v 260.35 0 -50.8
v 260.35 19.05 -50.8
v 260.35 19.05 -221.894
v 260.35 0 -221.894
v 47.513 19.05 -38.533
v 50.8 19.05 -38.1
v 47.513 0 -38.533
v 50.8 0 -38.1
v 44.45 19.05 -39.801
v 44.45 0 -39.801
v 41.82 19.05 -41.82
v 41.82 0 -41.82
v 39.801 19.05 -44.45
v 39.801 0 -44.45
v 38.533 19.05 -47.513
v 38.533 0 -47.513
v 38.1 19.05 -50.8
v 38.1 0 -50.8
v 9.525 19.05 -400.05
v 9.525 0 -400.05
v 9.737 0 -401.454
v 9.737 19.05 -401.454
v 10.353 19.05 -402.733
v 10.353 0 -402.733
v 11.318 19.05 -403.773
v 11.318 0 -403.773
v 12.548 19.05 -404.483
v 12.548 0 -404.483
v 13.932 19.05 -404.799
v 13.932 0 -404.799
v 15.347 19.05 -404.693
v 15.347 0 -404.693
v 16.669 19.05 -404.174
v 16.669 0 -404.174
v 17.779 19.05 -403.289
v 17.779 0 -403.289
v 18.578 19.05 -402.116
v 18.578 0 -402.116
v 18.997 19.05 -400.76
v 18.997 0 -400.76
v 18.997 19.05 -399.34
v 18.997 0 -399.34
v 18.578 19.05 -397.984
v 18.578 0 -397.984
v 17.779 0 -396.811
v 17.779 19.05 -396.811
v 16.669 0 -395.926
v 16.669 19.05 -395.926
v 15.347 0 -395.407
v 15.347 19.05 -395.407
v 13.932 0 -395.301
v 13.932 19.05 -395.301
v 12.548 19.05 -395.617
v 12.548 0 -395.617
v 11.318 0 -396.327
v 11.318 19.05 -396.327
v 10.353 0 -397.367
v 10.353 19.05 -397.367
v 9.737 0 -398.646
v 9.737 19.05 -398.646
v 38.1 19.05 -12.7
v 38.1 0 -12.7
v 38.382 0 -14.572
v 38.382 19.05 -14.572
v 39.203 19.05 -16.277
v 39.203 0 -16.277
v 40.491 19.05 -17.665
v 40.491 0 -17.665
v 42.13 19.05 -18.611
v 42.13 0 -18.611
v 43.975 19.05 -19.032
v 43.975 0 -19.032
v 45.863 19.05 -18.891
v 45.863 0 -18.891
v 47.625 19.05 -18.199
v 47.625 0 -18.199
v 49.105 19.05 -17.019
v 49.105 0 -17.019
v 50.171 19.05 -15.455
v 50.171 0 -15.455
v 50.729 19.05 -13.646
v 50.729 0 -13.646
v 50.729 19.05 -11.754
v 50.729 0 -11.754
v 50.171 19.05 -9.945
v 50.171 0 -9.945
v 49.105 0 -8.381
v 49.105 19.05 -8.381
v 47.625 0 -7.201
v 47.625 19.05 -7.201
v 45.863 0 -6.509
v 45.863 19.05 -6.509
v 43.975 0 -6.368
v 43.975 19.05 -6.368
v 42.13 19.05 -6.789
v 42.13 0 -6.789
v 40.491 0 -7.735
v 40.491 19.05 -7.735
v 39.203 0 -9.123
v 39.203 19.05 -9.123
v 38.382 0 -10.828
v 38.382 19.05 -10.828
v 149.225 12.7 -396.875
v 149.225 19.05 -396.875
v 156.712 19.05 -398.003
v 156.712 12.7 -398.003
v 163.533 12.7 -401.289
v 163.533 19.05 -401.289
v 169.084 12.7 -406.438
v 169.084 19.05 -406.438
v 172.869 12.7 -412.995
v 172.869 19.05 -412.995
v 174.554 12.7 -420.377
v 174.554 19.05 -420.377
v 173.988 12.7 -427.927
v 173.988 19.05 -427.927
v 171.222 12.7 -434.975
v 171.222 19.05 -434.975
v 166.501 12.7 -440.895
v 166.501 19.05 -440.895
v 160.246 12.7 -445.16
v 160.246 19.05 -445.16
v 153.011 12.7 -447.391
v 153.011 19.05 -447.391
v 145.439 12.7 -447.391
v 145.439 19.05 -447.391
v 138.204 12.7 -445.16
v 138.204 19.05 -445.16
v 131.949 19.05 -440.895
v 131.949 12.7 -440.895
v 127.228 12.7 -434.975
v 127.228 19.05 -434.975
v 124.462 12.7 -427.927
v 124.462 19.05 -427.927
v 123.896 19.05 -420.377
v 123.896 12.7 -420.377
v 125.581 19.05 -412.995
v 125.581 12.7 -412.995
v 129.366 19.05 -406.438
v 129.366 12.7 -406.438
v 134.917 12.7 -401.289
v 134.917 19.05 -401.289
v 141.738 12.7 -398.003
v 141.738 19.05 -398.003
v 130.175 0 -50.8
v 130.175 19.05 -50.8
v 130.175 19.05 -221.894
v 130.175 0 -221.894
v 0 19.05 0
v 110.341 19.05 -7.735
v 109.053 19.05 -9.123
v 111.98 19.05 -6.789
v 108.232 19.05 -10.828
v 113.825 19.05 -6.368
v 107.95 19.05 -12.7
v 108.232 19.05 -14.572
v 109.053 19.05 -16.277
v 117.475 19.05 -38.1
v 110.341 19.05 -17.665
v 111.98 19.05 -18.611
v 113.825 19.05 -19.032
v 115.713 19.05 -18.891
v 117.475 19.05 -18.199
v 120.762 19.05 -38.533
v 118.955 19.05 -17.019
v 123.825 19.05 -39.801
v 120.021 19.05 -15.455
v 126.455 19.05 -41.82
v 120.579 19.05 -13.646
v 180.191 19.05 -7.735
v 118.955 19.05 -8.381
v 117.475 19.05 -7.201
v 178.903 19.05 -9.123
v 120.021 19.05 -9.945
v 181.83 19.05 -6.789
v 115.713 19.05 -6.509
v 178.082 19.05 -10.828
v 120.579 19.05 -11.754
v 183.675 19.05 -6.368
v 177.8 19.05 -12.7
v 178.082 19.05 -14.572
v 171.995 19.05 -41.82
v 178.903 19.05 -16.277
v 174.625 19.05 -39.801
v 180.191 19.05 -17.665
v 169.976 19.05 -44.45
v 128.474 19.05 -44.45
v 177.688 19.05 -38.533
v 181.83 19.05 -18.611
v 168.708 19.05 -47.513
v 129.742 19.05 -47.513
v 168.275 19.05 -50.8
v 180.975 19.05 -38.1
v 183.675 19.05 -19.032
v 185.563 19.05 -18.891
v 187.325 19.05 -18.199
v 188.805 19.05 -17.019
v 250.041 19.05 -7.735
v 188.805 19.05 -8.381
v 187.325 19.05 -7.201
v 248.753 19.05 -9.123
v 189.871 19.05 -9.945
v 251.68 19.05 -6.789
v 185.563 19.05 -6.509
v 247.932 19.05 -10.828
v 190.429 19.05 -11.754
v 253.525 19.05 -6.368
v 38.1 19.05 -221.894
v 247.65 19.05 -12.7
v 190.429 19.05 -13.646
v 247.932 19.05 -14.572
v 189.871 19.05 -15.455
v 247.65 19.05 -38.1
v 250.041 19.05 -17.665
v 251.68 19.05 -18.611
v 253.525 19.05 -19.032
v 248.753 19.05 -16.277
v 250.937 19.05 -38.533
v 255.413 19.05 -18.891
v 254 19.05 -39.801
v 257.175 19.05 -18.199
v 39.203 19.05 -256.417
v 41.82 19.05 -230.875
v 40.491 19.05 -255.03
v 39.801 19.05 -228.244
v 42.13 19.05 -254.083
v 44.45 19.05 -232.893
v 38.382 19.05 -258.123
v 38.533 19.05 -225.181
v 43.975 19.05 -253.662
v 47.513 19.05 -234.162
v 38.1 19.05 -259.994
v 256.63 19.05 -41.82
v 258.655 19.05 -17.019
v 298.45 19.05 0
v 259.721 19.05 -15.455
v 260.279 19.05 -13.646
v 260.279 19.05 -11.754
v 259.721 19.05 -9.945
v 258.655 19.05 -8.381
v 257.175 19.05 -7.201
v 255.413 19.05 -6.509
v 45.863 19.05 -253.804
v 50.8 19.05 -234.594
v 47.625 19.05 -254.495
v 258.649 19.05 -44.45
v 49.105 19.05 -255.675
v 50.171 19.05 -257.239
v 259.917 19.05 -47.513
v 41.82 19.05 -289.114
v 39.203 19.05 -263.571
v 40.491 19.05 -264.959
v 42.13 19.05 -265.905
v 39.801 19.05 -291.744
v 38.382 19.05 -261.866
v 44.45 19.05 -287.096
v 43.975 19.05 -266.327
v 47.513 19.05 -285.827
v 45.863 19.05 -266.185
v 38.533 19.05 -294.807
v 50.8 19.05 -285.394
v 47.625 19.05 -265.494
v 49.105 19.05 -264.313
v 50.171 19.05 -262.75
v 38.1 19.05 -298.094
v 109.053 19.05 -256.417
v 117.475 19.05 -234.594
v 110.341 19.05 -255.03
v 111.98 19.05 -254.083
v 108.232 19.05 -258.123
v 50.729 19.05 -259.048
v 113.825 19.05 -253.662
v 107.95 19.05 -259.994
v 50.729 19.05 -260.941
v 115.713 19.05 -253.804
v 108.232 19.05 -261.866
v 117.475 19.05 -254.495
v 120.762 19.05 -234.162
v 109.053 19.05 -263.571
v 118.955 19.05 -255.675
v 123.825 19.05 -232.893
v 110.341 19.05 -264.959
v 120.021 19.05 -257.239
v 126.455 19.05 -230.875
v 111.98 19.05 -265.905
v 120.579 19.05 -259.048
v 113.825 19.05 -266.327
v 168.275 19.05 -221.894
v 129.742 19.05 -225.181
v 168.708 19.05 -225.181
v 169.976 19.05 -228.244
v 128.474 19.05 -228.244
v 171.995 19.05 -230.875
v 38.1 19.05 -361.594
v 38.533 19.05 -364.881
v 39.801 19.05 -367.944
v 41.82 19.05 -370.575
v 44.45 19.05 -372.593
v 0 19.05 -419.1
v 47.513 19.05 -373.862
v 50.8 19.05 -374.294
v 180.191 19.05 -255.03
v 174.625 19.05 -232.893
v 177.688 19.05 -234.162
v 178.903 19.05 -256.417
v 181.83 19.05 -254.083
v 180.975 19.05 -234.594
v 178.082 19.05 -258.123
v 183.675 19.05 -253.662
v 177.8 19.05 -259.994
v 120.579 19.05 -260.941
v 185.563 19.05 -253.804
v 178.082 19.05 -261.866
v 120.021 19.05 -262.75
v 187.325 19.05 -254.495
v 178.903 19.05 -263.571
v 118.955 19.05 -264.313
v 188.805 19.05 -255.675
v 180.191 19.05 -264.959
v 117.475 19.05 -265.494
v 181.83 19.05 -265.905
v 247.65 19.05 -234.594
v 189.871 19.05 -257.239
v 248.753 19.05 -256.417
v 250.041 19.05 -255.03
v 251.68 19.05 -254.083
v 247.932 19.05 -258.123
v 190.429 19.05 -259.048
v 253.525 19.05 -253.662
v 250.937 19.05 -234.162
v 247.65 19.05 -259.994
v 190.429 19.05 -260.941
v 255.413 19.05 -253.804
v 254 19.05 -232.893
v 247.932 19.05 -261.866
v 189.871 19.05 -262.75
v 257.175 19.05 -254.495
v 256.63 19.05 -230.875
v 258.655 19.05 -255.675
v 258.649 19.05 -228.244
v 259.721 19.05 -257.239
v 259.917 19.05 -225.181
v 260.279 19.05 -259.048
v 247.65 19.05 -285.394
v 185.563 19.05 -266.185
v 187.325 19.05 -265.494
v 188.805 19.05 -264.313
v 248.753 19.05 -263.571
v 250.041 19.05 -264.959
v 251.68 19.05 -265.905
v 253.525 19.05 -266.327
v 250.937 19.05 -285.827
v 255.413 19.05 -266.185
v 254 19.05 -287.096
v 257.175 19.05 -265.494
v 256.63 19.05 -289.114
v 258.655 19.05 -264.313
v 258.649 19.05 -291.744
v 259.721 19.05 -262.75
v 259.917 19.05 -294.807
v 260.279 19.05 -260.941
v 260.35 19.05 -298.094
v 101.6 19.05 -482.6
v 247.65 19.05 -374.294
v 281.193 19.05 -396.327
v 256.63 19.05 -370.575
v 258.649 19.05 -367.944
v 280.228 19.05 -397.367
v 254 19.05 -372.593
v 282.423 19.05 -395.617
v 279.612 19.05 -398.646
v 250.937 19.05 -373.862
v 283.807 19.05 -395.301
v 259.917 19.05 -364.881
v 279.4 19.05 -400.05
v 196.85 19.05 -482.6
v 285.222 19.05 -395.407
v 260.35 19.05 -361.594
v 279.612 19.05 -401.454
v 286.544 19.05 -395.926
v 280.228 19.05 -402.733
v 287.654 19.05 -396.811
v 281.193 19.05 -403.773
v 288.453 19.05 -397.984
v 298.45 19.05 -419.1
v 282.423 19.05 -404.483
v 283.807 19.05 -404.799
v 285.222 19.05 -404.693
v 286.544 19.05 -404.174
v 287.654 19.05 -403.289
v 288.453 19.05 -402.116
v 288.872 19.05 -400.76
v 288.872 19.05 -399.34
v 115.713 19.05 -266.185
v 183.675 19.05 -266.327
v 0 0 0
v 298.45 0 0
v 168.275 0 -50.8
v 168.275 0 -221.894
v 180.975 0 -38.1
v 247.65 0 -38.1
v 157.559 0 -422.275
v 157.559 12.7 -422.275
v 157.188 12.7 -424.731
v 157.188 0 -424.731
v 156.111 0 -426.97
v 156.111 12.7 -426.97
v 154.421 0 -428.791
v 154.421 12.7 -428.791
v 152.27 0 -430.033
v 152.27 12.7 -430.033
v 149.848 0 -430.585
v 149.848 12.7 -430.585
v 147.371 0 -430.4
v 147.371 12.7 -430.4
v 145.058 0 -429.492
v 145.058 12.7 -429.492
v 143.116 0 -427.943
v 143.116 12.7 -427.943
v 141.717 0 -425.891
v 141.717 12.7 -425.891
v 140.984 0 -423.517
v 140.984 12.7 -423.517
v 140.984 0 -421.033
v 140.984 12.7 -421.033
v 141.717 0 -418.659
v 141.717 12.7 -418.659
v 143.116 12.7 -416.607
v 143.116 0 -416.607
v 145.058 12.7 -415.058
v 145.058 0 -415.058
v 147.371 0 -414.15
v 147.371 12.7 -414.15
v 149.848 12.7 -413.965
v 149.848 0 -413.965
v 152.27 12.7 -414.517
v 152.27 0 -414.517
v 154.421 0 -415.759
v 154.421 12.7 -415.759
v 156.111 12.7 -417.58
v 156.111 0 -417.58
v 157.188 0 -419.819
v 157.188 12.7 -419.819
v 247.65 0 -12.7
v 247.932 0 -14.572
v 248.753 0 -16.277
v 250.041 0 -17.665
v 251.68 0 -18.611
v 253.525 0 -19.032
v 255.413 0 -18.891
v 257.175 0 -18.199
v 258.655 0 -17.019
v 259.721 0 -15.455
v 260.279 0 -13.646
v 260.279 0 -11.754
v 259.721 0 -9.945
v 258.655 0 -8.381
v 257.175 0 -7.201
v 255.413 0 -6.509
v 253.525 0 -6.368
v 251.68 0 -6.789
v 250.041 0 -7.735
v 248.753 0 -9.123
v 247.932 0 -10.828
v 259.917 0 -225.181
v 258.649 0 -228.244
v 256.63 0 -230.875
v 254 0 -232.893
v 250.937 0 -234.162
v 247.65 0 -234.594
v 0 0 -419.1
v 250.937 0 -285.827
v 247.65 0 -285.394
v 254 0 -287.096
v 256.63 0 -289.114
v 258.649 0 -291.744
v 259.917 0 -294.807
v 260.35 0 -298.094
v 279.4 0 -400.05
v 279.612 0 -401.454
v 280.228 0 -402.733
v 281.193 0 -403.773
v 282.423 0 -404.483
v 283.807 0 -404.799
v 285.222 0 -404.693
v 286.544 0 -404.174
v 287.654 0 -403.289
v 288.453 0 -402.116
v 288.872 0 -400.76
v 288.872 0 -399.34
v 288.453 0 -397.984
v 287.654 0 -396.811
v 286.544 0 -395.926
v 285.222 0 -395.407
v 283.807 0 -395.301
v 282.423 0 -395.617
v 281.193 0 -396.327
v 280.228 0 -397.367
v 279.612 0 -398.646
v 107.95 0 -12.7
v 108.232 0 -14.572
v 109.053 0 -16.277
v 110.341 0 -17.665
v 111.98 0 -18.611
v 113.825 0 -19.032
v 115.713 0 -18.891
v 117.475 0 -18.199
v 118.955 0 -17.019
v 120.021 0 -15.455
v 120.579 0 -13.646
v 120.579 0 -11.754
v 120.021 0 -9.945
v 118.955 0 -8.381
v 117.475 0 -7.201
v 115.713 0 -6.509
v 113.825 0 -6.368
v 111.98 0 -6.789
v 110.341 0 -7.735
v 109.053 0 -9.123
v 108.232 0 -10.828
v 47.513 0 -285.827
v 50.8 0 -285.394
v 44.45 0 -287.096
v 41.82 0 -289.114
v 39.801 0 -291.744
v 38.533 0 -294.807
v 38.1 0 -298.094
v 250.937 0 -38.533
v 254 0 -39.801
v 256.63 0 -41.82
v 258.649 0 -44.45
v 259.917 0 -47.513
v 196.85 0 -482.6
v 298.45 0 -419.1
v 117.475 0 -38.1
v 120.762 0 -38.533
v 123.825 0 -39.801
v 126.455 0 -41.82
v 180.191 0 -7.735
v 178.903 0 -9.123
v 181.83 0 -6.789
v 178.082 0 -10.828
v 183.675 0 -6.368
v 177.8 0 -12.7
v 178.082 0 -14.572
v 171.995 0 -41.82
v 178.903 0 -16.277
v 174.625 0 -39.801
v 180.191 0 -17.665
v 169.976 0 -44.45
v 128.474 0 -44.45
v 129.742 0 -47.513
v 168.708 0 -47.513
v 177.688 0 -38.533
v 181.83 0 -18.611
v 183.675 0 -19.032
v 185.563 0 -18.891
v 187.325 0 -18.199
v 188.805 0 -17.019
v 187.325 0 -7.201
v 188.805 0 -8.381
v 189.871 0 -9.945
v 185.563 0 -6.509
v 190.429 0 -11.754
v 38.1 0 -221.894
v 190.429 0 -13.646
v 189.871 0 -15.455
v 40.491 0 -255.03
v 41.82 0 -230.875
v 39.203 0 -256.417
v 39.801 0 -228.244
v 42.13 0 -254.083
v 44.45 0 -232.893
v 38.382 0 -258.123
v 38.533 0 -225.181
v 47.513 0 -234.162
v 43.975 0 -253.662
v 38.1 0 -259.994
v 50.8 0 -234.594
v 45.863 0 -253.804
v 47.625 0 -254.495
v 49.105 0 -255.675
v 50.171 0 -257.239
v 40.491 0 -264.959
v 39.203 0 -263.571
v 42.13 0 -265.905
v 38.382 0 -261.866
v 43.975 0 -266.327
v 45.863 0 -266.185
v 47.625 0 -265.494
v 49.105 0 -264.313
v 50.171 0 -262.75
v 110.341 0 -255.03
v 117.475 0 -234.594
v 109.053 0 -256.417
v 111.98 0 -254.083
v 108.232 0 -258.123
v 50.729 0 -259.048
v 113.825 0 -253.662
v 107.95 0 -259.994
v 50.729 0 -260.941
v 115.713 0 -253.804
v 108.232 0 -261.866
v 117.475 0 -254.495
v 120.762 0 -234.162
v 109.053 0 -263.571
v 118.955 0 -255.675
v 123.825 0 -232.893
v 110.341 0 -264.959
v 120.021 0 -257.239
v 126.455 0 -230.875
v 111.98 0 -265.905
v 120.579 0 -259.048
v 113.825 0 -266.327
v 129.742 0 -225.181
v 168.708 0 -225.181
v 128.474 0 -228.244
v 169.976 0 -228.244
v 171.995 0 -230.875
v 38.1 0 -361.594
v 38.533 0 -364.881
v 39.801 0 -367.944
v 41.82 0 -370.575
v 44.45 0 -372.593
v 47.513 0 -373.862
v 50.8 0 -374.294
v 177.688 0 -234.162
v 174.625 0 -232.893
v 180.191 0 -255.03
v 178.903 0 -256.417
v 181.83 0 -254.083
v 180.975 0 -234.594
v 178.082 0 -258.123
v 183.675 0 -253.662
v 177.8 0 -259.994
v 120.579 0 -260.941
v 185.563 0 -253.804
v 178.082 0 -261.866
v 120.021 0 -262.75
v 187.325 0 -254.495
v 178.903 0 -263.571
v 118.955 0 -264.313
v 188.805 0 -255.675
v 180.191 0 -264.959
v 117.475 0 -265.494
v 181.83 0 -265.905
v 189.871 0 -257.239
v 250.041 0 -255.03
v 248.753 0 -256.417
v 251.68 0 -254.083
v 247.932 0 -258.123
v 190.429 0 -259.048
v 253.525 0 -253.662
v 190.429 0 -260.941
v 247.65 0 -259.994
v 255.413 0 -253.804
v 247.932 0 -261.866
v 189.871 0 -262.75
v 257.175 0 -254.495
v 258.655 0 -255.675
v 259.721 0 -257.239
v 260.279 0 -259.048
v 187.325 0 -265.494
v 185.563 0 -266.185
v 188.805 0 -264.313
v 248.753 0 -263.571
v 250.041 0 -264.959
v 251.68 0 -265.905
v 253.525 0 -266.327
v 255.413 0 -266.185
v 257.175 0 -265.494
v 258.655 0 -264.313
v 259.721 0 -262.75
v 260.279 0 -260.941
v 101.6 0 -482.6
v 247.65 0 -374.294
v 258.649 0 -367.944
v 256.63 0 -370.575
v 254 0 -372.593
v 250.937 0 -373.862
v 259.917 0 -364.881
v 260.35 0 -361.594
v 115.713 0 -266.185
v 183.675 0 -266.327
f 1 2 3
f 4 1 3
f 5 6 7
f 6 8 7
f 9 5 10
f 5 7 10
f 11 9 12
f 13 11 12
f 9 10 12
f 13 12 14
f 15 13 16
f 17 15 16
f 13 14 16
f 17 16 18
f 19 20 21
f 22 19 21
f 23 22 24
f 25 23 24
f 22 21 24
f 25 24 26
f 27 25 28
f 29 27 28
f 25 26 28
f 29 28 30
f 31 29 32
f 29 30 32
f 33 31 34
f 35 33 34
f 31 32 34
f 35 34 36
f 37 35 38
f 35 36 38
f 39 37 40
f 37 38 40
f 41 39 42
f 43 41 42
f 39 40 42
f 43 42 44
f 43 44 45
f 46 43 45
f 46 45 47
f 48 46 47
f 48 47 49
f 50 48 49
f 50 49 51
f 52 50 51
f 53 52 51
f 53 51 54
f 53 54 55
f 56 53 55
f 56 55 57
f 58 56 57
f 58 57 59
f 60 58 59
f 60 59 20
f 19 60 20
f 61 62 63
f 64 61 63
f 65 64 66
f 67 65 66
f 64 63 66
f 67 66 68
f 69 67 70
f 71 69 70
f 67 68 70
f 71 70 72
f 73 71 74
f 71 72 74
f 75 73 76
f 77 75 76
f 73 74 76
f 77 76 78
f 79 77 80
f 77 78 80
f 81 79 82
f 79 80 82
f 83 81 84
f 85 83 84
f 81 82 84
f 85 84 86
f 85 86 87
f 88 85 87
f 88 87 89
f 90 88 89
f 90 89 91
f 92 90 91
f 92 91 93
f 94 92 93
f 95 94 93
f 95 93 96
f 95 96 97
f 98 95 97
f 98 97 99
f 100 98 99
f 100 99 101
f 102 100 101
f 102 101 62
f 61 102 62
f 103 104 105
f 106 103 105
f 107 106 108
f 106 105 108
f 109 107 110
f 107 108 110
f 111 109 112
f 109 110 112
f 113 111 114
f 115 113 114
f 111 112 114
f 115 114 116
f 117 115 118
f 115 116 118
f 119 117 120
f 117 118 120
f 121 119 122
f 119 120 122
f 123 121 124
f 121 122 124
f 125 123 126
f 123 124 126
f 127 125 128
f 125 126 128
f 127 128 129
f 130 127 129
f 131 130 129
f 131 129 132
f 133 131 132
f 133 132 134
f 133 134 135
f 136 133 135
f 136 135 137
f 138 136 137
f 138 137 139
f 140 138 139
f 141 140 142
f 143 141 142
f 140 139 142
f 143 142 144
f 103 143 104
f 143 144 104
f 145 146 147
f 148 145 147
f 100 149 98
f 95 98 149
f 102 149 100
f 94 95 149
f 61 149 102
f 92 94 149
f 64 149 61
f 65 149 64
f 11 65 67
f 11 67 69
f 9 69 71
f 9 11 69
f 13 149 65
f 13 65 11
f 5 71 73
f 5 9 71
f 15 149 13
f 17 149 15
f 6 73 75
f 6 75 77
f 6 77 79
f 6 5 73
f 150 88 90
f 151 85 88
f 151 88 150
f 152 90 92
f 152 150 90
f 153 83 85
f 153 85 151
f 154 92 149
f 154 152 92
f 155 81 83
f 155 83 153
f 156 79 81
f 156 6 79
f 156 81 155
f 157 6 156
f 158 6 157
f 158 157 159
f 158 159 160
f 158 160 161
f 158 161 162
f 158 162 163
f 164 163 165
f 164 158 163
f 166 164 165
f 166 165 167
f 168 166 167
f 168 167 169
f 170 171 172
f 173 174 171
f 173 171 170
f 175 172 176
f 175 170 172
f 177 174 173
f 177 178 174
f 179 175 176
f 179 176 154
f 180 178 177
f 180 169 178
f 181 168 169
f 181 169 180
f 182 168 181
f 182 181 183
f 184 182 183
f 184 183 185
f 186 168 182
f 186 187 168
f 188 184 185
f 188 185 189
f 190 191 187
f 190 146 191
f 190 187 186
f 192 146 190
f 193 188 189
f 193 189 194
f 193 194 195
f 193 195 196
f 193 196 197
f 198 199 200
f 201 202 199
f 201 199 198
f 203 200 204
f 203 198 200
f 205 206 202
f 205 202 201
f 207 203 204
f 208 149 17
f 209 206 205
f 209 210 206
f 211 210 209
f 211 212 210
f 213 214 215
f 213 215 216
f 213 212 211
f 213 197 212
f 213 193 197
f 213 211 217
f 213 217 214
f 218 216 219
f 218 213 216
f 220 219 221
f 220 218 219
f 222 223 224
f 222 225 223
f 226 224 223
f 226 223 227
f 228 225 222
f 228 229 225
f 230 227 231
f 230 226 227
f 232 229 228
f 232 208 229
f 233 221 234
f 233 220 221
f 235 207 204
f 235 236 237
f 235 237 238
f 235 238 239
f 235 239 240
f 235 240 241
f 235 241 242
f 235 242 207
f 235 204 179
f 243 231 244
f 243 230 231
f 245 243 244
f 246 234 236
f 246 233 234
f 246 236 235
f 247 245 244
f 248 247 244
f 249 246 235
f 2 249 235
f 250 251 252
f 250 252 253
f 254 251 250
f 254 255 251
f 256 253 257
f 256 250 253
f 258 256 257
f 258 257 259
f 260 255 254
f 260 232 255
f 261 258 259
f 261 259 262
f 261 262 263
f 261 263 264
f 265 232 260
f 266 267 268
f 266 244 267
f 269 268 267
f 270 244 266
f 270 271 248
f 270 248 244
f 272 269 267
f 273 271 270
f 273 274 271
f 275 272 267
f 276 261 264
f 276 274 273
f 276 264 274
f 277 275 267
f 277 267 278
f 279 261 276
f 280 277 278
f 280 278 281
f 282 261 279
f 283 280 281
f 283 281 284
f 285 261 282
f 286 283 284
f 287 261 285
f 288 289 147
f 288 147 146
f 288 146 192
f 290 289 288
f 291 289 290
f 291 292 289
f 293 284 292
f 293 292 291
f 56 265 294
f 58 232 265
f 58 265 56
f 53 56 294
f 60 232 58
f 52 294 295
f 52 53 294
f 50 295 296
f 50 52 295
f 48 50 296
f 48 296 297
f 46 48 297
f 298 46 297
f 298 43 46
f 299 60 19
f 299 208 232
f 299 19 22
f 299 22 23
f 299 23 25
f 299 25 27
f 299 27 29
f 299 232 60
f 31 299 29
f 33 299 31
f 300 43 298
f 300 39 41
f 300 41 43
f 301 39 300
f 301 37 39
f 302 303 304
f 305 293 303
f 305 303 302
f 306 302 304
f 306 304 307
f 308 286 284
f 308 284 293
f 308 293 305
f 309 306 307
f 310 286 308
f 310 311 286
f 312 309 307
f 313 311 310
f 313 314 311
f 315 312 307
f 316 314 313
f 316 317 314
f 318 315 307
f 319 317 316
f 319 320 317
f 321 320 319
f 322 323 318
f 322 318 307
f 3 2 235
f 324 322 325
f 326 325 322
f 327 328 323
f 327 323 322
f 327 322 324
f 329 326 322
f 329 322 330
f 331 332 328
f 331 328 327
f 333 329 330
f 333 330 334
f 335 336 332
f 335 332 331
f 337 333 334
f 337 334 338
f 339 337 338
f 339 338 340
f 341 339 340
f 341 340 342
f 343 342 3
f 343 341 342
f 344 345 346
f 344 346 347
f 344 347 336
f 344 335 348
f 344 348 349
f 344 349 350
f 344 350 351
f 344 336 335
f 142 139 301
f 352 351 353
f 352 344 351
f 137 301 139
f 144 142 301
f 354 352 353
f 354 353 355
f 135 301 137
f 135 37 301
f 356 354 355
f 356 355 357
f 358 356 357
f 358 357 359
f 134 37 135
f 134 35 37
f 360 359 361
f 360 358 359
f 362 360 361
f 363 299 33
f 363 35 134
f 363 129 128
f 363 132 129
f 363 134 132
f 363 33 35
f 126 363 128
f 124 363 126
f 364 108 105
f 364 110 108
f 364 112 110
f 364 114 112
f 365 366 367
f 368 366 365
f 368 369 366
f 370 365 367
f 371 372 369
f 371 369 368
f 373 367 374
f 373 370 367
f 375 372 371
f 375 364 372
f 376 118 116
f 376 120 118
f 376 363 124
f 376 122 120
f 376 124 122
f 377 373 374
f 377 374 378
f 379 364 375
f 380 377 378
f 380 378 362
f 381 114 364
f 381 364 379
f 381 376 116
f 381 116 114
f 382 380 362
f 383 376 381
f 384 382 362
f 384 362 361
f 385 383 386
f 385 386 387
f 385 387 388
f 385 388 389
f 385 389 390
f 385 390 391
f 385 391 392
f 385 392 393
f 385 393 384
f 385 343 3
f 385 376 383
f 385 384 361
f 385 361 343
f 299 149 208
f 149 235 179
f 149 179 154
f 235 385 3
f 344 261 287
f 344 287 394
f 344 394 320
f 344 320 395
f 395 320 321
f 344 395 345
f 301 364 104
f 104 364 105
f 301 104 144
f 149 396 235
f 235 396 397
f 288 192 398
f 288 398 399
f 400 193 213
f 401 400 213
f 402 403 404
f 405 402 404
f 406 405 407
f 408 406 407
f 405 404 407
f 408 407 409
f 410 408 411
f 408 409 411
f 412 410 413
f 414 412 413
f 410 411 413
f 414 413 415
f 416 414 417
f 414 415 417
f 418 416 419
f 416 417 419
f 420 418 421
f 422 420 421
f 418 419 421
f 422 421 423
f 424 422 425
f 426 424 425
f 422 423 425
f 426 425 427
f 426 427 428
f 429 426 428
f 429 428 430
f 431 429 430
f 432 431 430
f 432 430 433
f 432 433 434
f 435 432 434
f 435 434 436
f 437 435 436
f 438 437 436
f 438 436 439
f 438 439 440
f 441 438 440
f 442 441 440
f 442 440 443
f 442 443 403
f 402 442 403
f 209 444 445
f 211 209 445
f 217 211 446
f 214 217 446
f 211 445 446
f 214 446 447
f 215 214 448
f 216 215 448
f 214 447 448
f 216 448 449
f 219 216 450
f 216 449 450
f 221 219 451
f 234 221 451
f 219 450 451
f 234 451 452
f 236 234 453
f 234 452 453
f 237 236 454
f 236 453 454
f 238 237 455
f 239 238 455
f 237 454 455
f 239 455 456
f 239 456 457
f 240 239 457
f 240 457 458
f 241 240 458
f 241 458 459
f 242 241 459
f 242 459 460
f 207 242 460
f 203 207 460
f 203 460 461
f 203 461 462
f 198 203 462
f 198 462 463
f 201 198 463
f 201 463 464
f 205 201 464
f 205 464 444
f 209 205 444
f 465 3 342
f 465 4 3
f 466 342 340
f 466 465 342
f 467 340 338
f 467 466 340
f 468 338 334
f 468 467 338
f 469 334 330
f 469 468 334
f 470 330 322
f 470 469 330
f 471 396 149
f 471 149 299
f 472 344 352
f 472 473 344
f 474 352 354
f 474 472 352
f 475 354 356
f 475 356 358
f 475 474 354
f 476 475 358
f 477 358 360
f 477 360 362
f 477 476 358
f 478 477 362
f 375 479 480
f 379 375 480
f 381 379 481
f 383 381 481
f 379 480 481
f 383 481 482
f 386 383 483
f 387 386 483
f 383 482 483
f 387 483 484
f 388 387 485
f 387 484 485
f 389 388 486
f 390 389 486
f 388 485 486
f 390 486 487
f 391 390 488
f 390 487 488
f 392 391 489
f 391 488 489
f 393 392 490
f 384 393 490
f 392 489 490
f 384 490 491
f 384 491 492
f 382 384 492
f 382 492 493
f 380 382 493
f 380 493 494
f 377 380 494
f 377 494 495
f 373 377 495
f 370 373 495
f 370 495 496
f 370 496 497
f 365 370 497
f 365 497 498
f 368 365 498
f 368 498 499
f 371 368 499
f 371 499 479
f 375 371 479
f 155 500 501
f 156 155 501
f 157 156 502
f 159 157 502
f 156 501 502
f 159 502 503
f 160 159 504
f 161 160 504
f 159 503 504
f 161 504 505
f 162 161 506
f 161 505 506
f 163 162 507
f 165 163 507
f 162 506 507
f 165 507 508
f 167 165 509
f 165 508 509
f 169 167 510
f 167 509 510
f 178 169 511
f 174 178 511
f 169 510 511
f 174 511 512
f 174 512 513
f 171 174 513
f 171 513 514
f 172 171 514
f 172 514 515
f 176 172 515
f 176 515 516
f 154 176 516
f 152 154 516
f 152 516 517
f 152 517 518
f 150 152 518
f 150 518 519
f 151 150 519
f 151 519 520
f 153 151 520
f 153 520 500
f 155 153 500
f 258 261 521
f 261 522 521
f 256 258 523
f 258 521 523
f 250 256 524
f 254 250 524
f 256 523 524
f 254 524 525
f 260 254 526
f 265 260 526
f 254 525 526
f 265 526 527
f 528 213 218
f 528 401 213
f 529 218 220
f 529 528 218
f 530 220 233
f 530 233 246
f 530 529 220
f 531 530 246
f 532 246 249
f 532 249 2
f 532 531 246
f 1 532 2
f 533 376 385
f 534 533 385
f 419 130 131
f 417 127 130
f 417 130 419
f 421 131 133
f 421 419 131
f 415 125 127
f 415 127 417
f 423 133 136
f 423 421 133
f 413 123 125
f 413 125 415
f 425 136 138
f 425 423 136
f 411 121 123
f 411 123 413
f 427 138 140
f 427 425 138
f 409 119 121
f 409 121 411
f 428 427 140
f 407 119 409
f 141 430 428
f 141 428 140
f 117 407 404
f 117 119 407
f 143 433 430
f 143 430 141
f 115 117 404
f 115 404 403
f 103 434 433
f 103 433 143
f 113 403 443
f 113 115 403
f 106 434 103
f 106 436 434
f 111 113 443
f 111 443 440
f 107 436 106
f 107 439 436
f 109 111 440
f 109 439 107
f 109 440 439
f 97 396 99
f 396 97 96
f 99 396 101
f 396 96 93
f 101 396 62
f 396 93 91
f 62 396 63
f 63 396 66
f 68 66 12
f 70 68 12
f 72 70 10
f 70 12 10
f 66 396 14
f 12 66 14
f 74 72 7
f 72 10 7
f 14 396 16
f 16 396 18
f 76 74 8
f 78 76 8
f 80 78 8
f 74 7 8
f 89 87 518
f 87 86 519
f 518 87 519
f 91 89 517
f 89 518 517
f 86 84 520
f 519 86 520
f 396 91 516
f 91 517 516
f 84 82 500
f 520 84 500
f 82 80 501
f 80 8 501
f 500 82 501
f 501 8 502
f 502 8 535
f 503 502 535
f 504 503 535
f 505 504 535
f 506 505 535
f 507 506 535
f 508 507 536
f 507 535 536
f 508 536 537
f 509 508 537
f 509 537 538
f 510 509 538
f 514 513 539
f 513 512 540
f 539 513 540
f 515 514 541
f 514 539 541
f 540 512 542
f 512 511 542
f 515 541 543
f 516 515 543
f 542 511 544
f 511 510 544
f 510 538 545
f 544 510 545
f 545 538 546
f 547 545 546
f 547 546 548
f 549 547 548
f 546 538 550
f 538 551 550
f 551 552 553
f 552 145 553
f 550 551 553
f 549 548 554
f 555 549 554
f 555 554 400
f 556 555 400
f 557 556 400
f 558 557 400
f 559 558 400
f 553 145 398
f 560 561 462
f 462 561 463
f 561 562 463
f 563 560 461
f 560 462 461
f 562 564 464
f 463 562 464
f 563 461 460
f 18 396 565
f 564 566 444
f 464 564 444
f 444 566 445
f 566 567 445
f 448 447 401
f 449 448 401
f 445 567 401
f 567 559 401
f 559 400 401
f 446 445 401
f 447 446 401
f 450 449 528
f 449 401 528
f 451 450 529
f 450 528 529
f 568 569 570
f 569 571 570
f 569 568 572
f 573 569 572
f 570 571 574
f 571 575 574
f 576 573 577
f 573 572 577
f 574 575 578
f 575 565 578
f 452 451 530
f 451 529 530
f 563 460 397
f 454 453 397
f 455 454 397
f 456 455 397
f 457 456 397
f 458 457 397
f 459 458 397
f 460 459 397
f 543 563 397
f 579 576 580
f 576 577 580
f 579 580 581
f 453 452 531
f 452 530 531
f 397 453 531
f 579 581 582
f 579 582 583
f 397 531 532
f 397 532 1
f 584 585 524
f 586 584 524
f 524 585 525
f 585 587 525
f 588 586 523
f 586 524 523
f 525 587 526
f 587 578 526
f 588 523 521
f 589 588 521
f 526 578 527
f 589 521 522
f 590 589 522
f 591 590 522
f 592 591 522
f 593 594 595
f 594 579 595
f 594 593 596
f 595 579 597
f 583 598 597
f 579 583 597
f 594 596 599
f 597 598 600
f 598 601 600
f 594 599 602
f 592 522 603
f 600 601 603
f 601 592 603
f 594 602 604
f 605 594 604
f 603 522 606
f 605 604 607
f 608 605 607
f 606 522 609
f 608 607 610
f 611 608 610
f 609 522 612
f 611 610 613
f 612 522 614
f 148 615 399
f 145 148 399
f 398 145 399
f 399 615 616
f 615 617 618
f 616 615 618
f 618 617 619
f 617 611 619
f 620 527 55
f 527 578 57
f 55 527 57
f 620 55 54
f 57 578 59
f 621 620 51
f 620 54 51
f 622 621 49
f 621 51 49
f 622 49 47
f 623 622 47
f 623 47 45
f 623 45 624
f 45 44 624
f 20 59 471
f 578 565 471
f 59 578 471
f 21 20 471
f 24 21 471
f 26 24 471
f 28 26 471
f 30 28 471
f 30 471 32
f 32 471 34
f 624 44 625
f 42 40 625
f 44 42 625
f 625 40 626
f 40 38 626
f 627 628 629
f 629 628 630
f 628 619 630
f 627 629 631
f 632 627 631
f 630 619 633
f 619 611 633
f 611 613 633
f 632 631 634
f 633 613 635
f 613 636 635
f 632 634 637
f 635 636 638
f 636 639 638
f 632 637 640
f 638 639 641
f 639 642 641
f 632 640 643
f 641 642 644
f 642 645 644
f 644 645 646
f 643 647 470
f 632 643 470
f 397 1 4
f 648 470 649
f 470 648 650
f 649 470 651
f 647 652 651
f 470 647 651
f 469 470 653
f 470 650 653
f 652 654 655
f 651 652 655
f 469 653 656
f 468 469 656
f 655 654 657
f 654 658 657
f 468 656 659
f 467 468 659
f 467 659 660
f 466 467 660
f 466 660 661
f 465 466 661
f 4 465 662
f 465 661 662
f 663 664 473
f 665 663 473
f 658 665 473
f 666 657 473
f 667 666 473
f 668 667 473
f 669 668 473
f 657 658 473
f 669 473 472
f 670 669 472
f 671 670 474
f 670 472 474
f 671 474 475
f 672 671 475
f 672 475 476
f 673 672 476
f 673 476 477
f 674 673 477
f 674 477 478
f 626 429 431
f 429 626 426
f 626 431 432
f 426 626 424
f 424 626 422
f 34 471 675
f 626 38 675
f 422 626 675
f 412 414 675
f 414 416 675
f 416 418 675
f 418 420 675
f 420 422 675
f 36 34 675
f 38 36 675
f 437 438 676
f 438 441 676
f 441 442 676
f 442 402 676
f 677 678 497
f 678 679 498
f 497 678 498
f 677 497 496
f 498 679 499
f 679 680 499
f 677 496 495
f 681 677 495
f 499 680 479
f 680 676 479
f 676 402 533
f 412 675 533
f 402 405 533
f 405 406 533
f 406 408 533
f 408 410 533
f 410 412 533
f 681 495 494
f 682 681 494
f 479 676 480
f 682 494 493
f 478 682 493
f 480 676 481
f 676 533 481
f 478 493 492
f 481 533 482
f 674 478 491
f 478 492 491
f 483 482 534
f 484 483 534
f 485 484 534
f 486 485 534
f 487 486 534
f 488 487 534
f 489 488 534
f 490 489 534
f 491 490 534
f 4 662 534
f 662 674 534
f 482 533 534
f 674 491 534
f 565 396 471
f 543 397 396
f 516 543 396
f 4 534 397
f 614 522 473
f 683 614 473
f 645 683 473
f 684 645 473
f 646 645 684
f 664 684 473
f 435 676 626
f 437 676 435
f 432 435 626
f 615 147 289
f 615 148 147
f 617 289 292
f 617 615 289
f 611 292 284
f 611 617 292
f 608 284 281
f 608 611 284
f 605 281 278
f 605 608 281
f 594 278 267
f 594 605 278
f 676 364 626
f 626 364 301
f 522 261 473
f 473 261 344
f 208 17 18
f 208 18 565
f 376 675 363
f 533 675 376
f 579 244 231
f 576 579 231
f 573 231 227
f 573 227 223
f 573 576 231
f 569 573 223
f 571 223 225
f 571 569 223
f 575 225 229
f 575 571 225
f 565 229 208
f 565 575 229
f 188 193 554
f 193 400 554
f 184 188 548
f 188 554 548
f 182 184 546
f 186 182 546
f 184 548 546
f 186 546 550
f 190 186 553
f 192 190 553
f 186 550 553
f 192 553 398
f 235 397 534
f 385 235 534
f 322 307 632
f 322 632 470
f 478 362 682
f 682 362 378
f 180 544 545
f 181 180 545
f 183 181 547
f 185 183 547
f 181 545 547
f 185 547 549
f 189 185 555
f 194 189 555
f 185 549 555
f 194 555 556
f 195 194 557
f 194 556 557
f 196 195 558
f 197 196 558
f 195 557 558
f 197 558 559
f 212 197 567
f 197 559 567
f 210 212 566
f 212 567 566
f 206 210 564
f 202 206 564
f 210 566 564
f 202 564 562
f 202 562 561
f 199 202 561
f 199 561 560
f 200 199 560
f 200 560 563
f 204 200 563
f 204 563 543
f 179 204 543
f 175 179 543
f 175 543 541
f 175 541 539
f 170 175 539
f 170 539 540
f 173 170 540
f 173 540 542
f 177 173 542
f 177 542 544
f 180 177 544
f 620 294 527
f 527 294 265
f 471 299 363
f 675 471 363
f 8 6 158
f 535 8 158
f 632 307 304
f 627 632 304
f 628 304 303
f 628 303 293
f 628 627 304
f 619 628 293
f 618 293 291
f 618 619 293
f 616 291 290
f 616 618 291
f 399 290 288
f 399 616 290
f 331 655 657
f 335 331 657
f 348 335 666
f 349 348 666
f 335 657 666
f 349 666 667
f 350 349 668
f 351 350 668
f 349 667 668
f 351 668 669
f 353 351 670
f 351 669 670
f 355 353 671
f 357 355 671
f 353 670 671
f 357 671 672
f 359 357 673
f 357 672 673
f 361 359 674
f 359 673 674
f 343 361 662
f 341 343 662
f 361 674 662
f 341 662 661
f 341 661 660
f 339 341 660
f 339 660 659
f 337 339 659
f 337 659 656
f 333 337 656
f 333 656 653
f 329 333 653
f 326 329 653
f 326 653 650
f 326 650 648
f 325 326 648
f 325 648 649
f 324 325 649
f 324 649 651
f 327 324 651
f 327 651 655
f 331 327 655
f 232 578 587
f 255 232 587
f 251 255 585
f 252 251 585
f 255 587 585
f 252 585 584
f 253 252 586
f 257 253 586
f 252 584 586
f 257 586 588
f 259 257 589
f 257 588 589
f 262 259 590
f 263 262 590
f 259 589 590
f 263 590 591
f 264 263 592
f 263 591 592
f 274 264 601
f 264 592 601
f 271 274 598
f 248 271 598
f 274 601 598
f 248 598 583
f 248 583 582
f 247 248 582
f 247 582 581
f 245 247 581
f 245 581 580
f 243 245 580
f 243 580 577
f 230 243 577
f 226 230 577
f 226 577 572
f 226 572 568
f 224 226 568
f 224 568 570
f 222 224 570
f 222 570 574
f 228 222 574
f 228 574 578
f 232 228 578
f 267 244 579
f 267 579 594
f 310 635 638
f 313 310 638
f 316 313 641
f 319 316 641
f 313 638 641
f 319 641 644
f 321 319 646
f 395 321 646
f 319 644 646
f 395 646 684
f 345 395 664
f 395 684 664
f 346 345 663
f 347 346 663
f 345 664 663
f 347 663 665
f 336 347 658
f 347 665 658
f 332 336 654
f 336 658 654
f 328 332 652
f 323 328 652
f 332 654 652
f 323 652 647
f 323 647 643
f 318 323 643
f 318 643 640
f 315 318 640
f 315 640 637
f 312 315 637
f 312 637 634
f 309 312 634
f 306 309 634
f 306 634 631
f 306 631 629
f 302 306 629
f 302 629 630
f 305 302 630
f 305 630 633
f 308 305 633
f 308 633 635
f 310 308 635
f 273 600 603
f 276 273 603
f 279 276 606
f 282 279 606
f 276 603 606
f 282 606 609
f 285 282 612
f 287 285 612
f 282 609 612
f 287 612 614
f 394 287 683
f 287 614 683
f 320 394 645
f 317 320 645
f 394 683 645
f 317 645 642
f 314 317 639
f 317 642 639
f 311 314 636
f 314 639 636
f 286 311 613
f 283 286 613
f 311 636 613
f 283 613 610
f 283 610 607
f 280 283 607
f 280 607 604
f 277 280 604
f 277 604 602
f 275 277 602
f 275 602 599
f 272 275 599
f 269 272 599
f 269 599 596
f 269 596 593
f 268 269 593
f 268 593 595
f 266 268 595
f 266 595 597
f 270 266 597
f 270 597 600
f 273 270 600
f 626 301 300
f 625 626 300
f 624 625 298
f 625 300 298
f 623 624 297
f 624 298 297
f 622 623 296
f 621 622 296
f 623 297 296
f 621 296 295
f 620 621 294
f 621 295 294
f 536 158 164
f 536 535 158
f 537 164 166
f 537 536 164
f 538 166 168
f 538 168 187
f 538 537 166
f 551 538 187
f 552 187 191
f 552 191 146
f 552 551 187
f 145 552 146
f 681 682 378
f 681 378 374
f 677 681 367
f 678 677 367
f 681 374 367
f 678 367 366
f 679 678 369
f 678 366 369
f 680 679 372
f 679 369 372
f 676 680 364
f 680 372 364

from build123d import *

# Parameters (mm, degrees)
SKETCH1_W                    = 298.45
SKETCH1_H                    = 482.6
BOSS_EXTRUDE1_DEPTH          = 19.05
F_1_2_0_5_DIAMETER_HOLE1_D   = 12.7
LPATTERN1_COUNT              = 4
LPATTERN1_PITCH              = 69.85
LPATTERN1_COUNT_DIR2         = 2
LPATTERN1_PITCH_DIR2         = 247.2944
F_3_8_0_375_DIAMETER_HOLE1_D = 9.525
SKETCH6_R                    = 25.4
CUT_EXTRUDE1_DEPTH           = 6.35
F_3_4_10_TAPPED_HOLE1_D      = 16.66748
SKETCH10_W                   = 92.075
SKETCH10_H                   = 196.4944
SKETCH10_H_2                 = 76.5556
CUT_EXTRUDE2_DEPTH           = 568.74824086
FILLET1_R                    = 12.7
CUT_EXTRUDE3_DEPTH           = 568.74824086
CUT_EXTRUDE4_DEPTH           = 568.74824086


with BuildPart() as part:
    # Sketch1 → Boss-Extrude1 (new body)
    with BuildSketch(Plane(origin=(0, 0, 0), x_dir=(1, 0, 0), z_dir=(0, 1, 0))):
        with Locations((149.225, 241.3)):
            Rectangle(SKETCH1_W, SKETCH1_H)
    extrude(amount=BOSS_EXTRUDE1_DEPTH)

    # 1/2 (0.5) Diameter Hole1 (through all)
    with Locations(Plane(origin=(0, 19.05, 0), x_dir=(1, 0, 0), z_dir=(0, 1, 0))):
        with Locations((44.45, 12.7)):
            f_1_2_0_5_diameter_hole1 = Hole(F_1_2_0_5_DIAMETER_HOLE1_D / 2)

    # LPattern1: 1_2 _0.5_ Diameter Hole1 4 × 2
    with Locations(*[(i * LPATTERN1_PITCH, 0, -j * LPATTERN1_PITCH_DIR2) for i in range(LPATTERN1_COUNT) for j in range(LPATTERN1_COUNT_DIR2) if (i, j) != (0, 0)]):
        add(f_1_2_0_5_diameter_hole1, mode=Mode.SUBTRACT)

    # 3/8 (0.375) Diameter Hole1 (through all)
    with Locations(Plane(origin=(0, 19.05, 0), x_dir=(1, 0, 0), z_dir=(0, 1, 0))):
        with Locations((284.1625, 400.05), (14.2875, 400.05)):
            Hole(F_3_8_0_375_DIAMETER_HOLE1_D / 2)

    # Sketch6 → Cut-Extrude1 (cut)
    with BuildSketch(Plane(origin=(0, 19.05, 0), x_dir=(1, 0, 0), z_dir=(0, 1, 0))):
        with Locations(Location((149.225, 422.275, 0), (0, 0, 270))):
            Circle(SKETCH6_R)
    extrude(amount=-CUT_EXTRUDE1_DEPTH, mode=Mode.SUBTRACT)

    # 3/4-10 Tapped Hole1 (through all)
    with Locations(Plane(origin=(0, 0, 0), x_dir=(-1, 0, 0), z_dir=(0, -1, 0))):
        with Locations((-149.225, 422.275)):
            Hole(F_3_4_10_TAPPED_HOLE1_D / 2)

    # Sketch10 → Cut-Extrude2 (cut, through all)
    with BuildSketch(Plane(origin=(0, 19.05, 0), x_dir=(1, 0, 0), z_dir=(0, 1, 0))):
        with Locations((84.1375, 136.3472)):
            Rectangle(SKETCH10_W, SKETCH10_H)
        with Locations((214.3125, 136.3472)):
            Rectangle(SKETCH10_W, SKETCH10_H)
        with Locations((84.1375, 323.6722)):
            Rectangle(SKETCH10_W, SKETCH10_H_2)
        with Locations((214.3125, 323.6722)):
            Rectangle(SKETCH10_W, SKETCH10_H_2)
    extrude(amount=-CUT_EXTRUDE2_DEPTH, mode=Mode.SUBTRACT)

    # Fillet1
    fillet1_edges = [part.edges().sort_by_distance(p)[0] for p in [
        (38.1, 9.525, -38.1),
        (38.1, 9.525, -234.5944),
        (130.175, 9.525, -234.5944),
        (130.175, 9.525, -38.1),
        (168.275, 9.525, -38.1),
        (168.275, 9.525, -234.5944),
        (260.35, 9.525, -234.5944),
        (260.35, 9.525, -38.1),
        (38.1, 9.525, -285.3944),
        (38.1, 9.525, -361.95),
        (130.175, 9.525, -361.95),
        (130.175, 9.525, -285.3944),
        (168.275, 9.525, -285.3944),
        (168.275, 9.525, -361.95),
        (260.35, 9.525, -361.95),
        (260.35, 9.525, -285.3944),
    ]]
    fillet(fillet1_edges, radius=FILLET1_R)

    # Sketch11 → Cut-Extrude3 (cut, through all)
    with BuildSketch(Plane(origin=(0, 19.05, 0), x_dir=(1, 0, 0), z_dir=(0, 1, 0))):
        Polygon((0, 482.6), (0, 419.1), (101.6, 482.6), align=None)
        Polygon((298.45, 482.6), (196.85, 482.6), (298.45, 419.1), align=None)
    extrude(amount=-CUT_EXTRUDE3_DEPTH, mode=Mode.SUBTRACT)

    # Sketch12 → Cut-Extrude4 (cut, through all)
    with BuildSketch(Plane(origin=(0, 19.05, 0), x_dir=(1, 0, 0), z_dir=(0, 1, 0))):
        with BuildLine():
            Line((50.8, 285.3944), (247.65, 285.3944))
            ThreePointArc((247.65, 285.3944), (256.630256121, 289.114143879), (260.35, 298.0944))
            Line((260.35, 298.0944), (260.35, 361.5944))
            ThreePointArc((260.35, 361.5944), (256.630256121, 370.574656121), (247.65, 374.2944))
            Line((247.65, 374.2944), (50.8, 374.2944))
            ThreePointArc((50.8, 374.2944), (41.819743879, 370.574656121), (38.1, 361.5944))
            Line((38.1, 361.5944), (38.1, 298.0944))
            ThreePointArc((38.1, 298.0944), (41.819743879, 289.114143879), (50.8, 285.3944))
        make_face()
    extrude(amount=-CUT_EXTRUDE4_DEPTH, mode=Mode.SUBTRACT)


solid = part.part
